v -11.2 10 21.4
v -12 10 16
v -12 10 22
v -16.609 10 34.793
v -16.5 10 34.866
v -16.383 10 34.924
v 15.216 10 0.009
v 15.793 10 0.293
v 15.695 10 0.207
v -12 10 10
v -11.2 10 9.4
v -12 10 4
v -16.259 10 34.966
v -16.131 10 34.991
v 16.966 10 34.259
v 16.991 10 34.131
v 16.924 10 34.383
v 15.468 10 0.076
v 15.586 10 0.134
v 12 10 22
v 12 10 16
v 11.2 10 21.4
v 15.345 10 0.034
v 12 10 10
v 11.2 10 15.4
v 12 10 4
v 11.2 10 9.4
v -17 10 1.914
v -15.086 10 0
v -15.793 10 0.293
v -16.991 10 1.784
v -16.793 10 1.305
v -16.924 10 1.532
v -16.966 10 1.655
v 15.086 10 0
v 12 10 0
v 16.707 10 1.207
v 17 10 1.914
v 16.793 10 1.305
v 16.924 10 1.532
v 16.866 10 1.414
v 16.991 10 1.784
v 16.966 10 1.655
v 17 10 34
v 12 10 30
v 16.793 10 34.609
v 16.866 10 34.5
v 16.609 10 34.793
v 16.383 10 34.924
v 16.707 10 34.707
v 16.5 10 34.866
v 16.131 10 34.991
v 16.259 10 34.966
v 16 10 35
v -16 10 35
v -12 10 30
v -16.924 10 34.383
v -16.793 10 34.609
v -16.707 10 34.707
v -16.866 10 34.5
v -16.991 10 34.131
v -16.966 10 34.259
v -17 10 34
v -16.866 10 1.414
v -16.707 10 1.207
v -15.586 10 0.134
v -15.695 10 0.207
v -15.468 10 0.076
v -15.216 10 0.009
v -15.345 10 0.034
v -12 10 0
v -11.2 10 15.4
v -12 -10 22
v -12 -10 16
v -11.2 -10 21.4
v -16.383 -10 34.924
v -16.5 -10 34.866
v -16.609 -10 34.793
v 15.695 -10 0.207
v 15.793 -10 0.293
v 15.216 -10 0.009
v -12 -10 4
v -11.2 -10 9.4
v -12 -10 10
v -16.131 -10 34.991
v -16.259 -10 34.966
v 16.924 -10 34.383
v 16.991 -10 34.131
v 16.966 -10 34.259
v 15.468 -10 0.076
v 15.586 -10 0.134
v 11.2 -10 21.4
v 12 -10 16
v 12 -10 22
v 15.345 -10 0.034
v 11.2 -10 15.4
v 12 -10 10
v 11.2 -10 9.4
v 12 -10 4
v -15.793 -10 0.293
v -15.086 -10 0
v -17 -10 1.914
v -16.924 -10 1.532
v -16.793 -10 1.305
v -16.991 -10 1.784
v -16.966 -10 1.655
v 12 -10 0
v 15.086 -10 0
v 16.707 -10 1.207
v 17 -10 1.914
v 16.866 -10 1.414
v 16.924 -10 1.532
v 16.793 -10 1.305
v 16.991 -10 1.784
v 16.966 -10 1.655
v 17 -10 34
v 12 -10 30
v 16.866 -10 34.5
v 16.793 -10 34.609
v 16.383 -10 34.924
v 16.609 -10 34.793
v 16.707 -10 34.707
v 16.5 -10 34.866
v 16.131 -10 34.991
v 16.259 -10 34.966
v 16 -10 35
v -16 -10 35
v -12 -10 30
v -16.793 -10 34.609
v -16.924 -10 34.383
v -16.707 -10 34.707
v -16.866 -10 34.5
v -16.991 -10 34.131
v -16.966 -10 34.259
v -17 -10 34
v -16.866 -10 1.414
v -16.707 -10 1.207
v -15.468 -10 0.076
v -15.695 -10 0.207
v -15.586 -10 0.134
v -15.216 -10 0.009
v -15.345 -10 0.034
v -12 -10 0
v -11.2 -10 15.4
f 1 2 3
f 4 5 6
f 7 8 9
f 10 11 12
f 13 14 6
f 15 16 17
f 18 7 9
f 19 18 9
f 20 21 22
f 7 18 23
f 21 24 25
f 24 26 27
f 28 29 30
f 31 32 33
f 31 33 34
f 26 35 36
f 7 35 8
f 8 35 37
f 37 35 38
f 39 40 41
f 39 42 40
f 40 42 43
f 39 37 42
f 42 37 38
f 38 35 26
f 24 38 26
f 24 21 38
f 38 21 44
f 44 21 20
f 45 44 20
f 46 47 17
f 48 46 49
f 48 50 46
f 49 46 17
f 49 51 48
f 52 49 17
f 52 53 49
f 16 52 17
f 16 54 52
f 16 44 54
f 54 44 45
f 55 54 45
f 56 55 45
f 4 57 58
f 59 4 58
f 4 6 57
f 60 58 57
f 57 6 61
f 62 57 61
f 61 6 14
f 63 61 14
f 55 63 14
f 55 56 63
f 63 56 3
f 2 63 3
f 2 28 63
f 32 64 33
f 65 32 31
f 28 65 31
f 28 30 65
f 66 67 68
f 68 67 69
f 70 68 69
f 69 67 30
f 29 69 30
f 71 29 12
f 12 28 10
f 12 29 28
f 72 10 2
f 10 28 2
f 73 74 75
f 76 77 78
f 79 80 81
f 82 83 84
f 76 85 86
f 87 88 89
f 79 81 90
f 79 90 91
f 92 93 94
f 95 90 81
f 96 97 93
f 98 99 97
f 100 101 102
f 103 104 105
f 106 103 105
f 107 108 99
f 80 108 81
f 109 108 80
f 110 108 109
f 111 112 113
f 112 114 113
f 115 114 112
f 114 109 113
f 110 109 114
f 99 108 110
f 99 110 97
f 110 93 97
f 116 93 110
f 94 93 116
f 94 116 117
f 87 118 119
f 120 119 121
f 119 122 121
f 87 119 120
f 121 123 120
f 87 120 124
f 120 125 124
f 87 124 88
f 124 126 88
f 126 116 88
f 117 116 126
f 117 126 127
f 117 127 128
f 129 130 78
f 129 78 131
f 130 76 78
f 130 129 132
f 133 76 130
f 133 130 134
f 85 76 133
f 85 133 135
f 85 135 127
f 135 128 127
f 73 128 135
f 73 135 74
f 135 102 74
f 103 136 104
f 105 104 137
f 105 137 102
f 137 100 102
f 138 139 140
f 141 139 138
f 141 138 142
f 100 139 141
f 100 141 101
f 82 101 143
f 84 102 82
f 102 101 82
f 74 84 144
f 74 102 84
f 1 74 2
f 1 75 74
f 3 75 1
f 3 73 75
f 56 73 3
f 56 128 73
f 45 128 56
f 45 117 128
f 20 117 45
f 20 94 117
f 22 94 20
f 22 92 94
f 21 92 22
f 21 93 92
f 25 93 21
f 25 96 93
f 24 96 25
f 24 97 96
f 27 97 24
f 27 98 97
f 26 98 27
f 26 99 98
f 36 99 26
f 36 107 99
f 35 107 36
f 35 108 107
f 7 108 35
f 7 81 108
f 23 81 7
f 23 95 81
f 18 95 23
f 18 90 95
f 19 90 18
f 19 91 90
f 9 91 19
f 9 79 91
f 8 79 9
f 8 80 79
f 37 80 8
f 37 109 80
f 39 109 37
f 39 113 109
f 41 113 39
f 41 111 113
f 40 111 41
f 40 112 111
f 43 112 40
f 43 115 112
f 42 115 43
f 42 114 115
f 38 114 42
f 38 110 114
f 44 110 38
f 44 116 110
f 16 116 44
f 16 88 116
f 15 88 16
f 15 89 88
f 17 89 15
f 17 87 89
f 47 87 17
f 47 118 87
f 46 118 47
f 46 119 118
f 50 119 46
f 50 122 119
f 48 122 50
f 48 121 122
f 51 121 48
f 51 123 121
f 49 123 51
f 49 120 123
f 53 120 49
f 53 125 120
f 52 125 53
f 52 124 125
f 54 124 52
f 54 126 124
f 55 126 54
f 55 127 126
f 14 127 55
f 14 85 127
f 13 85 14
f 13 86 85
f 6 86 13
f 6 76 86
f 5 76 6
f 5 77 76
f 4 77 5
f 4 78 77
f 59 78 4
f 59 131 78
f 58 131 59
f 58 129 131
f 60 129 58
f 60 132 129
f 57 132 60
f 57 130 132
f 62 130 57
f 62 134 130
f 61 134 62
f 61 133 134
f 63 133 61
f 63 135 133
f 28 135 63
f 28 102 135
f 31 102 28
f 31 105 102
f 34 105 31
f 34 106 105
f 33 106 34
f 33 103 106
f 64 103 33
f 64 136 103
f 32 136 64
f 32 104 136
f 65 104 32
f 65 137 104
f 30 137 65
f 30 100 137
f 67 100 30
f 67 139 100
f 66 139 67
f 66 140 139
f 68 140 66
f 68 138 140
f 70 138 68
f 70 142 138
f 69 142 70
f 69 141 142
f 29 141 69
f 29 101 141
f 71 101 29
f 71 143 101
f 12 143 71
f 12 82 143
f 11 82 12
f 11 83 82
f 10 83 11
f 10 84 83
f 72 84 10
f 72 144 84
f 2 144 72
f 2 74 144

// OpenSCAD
// ===== Klip ve tvaru Π pro uchycení kapsáře na čelo šuplíku =====
// (verze s výstupky na vnitřních stranách ramen)

// --- Parametry (mm) ---
inner_w   = 24;   // vnitřní šířka mezi rameny (tloušťka čela šuplíku)
tol       = 0;    // přidaná vůle k vnitřní šířce
thick     = 5;    // tloušťka materiálu (příčka i ramena)
leg_len   = 30;   // délka ramen (od spodní strany příčky)
clip_w    = 20;   // šířka klipu (rozměr podél hrany šuplíku)
round_r   = 1;    // zaoblení vnějších hran (0 = ostré)
tip_chamf = 1.5;  // zkosení konců ramen zvenku (0 = vypnuto)

// --- Výstupky (zuby) ---
bump_on     = true;  // zapnout/vypnout výstupky
bump_h      = 0.8;   // výška výstupku (do vnitřní mezery)
bump_pitch  = 6;     // rozteč zubů (délka jednoho zubu podél ramene)
bump_n      = 3;     // počet zubů na každém rameni
bump_start  = 4;     // vzdálenost prvního zubu od konce ramene

$fn = 48;

iw = inner_w + tol;
ow = iw + 2*thick;
oh = leg_len + thick;

// jeden zub: pozvolný náběh zespoda, strmá hrana nahoře (proti vytažení)
module tooth() {
    polygon([
        [0,      0],
        [bump_h, bump_pitch*0.9],
        [0,      bump_pitch]
    ]);
}

module teeth() {
    for (i = [0 : bump_n-1]) {
        y0 = bump_start + i*bump_pitch;
        // levé rameno
        translate([-iw/2, y0]) tooth();
        // pravé rameno (zrcadlově)
        translate([ iw/2, y0]) mirror([1,0]) tooth();
    }
}

// 2D profil klipu (písmeno Π)
module profile() {
    union() {
        difference() {
            offset(r = round_r) offset(delta = -round_r)
            polygon([
                [-ow/2 + tip_chamf, 0],
                [ ow/2 - tip_chamf, 0],
                [ ow/2,             tip_chamf],
                [ ow/2,             oh],
                [-ow/2,             oh],
                [-ow/2,             tip_chamf]
            ]);
            translate([-iw/2, -1]) square([iw, leg_len + 1]);
        }
        if (bump_on) teeth();
    }
}

module pi_clip() {
    rotate([90, 0, 0])
        linear_extrude(height = clip_w, center = true)
            profile();
}

pi_clip();
